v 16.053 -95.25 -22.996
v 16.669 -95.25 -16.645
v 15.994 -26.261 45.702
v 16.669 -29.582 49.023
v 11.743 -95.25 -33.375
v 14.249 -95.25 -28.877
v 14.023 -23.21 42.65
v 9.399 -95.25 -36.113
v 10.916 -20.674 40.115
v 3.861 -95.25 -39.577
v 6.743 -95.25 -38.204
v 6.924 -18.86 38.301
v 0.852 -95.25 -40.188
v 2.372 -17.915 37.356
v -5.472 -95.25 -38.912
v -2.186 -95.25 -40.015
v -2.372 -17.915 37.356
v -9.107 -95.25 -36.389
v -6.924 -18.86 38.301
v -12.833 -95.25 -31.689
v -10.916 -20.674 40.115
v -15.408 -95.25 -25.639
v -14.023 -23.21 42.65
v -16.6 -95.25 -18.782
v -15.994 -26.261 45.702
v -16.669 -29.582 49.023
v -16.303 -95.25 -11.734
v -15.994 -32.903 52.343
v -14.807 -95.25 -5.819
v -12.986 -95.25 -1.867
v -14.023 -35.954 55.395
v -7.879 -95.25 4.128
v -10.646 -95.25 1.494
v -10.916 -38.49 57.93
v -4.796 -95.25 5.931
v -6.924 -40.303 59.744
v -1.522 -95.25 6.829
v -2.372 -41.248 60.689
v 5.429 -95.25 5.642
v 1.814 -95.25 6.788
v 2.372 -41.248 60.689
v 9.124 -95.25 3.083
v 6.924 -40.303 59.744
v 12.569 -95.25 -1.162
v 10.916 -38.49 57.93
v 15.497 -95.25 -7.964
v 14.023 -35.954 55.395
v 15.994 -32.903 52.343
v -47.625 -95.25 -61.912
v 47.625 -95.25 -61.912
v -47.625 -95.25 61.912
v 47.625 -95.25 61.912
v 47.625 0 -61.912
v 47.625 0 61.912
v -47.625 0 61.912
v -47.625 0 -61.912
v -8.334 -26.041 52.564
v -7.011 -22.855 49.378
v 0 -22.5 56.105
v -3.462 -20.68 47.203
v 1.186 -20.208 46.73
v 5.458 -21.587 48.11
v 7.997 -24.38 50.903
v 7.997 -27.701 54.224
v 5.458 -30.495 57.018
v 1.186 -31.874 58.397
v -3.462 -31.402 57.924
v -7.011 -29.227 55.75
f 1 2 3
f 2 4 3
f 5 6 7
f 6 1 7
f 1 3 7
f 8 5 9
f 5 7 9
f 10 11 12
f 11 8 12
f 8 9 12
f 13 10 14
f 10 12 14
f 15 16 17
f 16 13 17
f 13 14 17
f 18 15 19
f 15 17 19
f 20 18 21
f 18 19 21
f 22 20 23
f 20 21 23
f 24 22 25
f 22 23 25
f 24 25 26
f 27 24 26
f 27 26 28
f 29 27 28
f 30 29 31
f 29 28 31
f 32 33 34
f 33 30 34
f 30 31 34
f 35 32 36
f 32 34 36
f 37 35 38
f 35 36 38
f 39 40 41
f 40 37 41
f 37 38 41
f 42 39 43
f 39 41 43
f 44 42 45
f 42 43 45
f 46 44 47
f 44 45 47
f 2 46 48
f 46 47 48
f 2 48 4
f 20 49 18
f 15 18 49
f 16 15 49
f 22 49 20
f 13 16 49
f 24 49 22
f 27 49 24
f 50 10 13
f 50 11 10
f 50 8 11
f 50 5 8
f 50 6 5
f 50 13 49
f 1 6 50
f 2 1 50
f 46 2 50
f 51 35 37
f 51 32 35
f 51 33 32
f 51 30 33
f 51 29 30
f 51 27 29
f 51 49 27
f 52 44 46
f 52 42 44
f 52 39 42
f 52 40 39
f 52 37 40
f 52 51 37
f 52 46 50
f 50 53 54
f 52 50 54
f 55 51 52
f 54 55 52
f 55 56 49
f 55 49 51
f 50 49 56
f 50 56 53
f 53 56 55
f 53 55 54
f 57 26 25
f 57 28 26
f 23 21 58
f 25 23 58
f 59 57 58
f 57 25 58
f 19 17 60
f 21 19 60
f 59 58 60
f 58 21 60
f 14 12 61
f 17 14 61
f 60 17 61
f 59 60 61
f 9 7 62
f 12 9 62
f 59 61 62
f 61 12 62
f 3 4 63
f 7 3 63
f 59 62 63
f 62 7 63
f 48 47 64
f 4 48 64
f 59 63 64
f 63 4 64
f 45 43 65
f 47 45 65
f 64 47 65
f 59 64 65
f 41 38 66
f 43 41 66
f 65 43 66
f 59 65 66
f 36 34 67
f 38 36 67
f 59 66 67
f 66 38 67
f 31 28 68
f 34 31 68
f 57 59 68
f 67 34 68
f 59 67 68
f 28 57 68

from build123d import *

# Parameters (mm, degrees)
F0_W     = 95.25
F0_H     = 123.825
F1_DEPTH = 95.25
F5_D     = 33.3375
F5_DEPTH = 76.2
F5_START = 48.677356
F5_TIP   = 10.0155954434


with BuildPart() as f1:
    # F0 (on Front) → F1 (new body)
    with BuildSketch(Plane.XZ):
        Rectangle(F0_W, F0_H)
    extrude(amount=F1_DEPTH)

    # F5
    # its depths count from where the whole tool has entered the part; down to there all is cleared
    with Locations(Plane(origin=(0, -78.58125, -78.58125), x_dir=(-1, 0, 0), z_dir=(0, -0.7071067812, -0.7071067812)).offset(-F5_START)):
        with Locations((0, -55.5817782879)):
            Hole(F5_D / 2, depth=F5_DEPTH)
            with Locations((0, 0, -(F5_DEPTH + F5_TIP / 2))):  # 118° drill point
                Cone(0, F5_D / 2, F5_TIP, mode=Mode.SUBTRACT)


solid = f1.part
